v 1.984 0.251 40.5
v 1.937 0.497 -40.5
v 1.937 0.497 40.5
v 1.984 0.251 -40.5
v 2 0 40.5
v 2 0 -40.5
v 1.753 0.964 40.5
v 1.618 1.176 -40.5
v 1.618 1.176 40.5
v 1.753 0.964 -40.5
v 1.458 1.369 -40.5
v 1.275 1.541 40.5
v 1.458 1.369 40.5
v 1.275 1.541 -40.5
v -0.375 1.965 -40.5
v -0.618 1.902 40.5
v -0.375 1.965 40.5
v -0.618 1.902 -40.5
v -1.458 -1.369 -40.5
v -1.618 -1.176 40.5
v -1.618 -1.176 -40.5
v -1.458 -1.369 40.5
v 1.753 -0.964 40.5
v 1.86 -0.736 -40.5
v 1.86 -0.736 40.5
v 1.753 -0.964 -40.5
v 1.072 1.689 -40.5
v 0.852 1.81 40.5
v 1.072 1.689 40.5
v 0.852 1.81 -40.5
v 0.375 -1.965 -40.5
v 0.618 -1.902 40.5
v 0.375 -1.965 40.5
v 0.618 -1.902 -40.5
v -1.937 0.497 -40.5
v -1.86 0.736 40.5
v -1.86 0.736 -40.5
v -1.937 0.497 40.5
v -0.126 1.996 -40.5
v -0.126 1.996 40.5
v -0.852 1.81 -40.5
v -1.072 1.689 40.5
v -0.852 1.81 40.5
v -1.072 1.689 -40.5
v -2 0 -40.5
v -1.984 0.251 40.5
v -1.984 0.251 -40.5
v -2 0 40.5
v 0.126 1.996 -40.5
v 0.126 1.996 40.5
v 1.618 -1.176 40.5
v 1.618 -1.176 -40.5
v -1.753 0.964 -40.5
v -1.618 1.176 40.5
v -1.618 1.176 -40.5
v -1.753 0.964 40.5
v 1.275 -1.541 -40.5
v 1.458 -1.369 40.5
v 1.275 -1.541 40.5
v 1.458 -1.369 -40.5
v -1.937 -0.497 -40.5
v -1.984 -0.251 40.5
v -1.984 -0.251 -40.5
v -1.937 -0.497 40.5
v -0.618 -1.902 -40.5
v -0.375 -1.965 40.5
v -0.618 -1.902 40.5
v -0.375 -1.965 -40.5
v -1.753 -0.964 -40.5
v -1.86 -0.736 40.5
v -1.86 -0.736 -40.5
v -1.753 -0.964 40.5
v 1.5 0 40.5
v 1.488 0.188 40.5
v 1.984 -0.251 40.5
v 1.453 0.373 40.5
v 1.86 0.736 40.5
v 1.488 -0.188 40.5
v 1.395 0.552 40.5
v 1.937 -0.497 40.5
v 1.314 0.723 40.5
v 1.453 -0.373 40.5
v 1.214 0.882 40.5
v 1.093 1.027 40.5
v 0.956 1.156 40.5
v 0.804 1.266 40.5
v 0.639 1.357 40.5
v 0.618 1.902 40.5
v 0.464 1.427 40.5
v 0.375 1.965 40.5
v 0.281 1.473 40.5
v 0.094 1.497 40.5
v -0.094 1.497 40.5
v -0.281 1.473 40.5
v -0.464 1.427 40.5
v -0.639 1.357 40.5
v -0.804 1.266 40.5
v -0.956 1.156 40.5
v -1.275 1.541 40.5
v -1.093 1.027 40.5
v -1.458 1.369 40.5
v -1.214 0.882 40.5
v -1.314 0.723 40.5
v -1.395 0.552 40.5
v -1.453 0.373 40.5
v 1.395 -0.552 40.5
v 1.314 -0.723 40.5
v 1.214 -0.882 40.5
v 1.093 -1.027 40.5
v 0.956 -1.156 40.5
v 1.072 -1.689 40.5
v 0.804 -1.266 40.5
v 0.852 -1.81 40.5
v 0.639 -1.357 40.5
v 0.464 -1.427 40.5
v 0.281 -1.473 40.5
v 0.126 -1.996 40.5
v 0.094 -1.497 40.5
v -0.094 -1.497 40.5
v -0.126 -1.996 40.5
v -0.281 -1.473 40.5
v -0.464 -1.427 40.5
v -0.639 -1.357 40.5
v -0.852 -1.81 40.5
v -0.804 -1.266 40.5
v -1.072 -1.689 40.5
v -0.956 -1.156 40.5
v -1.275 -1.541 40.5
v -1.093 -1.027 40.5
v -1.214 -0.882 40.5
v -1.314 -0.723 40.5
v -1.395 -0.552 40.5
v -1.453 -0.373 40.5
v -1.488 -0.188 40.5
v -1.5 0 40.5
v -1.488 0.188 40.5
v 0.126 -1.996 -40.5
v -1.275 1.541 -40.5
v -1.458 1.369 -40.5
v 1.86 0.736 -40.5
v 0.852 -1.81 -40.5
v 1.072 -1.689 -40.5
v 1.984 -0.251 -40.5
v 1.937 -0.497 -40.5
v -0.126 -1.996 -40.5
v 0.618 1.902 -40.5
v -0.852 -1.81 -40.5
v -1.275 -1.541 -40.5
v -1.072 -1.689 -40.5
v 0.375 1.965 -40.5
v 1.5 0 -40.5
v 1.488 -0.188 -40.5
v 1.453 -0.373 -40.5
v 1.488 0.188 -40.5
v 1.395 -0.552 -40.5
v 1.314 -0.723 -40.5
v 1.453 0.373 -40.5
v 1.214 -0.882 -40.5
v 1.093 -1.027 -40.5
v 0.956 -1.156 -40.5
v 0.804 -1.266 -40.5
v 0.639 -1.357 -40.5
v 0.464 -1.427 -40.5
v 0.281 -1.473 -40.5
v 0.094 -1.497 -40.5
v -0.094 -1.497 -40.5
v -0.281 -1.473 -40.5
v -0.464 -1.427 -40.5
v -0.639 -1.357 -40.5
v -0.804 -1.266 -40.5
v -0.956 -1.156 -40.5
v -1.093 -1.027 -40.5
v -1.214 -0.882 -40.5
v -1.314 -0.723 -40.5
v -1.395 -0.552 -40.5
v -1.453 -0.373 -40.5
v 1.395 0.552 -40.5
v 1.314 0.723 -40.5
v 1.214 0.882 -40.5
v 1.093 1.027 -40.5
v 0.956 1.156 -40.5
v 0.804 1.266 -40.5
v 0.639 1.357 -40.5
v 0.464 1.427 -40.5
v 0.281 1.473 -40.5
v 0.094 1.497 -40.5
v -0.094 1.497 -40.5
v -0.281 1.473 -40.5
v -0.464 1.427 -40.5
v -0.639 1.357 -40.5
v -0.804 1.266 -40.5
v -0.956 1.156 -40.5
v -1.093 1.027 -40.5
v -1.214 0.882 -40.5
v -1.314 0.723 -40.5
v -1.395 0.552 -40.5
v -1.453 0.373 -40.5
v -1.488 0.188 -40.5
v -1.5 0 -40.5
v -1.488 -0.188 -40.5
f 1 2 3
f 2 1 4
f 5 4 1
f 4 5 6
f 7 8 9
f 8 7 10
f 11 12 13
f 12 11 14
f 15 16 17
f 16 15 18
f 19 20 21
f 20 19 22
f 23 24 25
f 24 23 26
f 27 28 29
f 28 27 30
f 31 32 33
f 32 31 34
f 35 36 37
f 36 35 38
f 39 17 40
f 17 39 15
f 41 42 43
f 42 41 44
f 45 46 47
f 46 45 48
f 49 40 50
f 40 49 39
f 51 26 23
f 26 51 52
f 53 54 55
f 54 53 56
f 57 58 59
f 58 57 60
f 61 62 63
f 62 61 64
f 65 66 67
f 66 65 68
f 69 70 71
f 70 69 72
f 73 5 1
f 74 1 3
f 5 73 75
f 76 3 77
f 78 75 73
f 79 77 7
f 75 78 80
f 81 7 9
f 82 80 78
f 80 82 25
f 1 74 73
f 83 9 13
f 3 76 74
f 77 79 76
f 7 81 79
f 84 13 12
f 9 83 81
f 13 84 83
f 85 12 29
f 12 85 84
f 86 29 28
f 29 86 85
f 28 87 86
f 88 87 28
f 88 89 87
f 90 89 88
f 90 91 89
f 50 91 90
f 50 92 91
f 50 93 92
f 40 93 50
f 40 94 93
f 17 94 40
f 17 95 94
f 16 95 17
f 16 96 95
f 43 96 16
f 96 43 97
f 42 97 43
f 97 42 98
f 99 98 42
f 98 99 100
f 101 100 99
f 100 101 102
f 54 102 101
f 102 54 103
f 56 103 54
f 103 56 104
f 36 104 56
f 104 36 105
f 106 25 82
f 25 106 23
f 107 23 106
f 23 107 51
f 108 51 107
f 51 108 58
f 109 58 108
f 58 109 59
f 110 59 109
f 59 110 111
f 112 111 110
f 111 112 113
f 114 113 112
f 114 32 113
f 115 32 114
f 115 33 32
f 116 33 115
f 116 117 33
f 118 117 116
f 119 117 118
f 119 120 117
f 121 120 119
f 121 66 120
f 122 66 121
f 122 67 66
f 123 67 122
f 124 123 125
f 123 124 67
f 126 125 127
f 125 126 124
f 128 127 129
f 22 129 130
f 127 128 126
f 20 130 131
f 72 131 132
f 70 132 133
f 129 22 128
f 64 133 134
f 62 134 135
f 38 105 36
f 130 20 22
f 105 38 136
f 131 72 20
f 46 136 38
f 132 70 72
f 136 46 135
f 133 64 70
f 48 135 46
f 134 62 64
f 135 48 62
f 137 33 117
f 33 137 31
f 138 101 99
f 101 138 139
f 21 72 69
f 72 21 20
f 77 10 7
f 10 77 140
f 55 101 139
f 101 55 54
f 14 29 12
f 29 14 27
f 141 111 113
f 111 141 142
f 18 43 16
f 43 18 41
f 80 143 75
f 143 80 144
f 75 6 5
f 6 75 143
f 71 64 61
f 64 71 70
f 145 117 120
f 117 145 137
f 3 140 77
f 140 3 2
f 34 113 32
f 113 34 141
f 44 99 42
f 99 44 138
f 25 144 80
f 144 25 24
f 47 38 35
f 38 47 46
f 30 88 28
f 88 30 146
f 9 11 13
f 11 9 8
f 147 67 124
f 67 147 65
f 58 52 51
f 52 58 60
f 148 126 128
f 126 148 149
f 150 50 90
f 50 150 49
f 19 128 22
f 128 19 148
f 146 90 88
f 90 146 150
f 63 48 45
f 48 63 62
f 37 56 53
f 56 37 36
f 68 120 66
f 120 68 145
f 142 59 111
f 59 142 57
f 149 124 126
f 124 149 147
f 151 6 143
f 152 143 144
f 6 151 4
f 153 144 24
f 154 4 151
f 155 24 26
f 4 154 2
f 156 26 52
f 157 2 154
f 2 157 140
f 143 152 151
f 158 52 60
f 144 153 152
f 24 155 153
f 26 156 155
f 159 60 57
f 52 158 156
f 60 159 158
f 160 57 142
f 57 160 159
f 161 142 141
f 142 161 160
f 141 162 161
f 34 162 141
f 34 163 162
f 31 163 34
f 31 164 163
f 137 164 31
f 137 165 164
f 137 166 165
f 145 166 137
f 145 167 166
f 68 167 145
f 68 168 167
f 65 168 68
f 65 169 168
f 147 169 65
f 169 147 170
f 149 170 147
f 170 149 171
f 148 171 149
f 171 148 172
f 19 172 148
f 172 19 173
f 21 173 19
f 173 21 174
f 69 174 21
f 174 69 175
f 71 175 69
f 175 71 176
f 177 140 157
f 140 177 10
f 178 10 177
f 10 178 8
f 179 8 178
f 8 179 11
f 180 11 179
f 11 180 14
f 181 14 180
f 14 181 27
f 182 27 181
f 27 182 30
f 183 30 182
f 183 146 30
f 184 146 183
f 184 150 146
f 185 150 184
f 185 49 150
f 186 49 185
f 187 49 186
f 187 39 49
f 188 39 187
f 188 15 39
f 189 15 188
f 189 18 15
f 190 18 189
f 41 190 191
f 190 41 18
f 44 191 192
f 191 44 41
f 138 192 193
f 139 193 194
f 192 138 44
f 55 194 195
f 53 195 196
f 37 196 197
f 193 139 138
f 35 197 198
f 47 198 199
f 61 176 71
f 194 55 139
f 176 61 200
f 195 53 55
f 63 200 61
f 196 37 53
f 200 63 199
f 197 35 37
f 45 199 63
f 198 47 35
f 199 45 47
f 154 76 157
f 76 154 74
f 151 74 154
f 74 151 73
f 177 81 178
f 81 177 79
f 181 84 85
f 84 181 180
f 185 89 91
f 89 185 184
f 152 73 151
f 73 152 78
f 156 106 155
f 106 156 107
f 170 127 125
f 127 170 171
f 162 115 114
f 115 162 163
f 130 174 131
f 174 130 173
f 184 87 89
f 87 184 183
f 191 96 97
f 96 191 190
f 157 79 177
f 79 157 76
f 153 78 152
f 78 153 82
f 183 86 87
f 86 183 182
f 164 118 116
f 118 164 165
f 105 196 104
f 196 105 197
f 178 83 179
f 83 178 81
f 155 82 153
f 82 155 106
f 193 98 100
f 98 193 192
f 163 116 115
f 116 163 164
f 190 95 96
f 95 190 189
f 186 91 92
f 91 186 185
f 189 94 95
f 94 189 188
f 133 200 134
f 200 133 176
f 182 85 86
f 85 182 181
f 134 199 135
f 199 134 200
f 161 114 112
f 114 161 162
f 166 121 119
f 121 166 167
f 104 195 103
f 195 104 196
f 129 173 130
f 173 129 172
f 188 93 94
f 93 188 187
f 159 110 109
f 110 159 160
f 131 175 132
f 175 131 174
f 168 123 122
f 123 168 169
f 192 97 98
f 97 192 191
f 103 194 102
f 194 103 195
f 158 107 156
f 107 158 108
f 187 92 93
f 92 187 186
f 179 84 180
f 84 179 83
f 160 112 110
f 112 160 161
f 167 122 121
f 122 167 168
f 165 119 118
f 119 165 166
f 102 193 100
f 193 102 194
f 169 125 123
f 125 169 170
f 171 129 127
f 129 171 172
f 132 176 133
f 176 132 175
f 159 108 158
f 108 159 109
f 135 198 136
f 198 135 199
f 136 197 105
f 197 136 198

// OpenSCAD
$fn = 50;


difference() {
	union() {
		translate(v = [0, 0, -40.5000000000]) {
			cylinder(h = 81, r = 2.0000000000);
		}
	}
	union() {
		translate(v = [0, 0, -100.0000000000]) {
			cylinder(h = 200, r = 1.5000000000);
		}
	}
}
